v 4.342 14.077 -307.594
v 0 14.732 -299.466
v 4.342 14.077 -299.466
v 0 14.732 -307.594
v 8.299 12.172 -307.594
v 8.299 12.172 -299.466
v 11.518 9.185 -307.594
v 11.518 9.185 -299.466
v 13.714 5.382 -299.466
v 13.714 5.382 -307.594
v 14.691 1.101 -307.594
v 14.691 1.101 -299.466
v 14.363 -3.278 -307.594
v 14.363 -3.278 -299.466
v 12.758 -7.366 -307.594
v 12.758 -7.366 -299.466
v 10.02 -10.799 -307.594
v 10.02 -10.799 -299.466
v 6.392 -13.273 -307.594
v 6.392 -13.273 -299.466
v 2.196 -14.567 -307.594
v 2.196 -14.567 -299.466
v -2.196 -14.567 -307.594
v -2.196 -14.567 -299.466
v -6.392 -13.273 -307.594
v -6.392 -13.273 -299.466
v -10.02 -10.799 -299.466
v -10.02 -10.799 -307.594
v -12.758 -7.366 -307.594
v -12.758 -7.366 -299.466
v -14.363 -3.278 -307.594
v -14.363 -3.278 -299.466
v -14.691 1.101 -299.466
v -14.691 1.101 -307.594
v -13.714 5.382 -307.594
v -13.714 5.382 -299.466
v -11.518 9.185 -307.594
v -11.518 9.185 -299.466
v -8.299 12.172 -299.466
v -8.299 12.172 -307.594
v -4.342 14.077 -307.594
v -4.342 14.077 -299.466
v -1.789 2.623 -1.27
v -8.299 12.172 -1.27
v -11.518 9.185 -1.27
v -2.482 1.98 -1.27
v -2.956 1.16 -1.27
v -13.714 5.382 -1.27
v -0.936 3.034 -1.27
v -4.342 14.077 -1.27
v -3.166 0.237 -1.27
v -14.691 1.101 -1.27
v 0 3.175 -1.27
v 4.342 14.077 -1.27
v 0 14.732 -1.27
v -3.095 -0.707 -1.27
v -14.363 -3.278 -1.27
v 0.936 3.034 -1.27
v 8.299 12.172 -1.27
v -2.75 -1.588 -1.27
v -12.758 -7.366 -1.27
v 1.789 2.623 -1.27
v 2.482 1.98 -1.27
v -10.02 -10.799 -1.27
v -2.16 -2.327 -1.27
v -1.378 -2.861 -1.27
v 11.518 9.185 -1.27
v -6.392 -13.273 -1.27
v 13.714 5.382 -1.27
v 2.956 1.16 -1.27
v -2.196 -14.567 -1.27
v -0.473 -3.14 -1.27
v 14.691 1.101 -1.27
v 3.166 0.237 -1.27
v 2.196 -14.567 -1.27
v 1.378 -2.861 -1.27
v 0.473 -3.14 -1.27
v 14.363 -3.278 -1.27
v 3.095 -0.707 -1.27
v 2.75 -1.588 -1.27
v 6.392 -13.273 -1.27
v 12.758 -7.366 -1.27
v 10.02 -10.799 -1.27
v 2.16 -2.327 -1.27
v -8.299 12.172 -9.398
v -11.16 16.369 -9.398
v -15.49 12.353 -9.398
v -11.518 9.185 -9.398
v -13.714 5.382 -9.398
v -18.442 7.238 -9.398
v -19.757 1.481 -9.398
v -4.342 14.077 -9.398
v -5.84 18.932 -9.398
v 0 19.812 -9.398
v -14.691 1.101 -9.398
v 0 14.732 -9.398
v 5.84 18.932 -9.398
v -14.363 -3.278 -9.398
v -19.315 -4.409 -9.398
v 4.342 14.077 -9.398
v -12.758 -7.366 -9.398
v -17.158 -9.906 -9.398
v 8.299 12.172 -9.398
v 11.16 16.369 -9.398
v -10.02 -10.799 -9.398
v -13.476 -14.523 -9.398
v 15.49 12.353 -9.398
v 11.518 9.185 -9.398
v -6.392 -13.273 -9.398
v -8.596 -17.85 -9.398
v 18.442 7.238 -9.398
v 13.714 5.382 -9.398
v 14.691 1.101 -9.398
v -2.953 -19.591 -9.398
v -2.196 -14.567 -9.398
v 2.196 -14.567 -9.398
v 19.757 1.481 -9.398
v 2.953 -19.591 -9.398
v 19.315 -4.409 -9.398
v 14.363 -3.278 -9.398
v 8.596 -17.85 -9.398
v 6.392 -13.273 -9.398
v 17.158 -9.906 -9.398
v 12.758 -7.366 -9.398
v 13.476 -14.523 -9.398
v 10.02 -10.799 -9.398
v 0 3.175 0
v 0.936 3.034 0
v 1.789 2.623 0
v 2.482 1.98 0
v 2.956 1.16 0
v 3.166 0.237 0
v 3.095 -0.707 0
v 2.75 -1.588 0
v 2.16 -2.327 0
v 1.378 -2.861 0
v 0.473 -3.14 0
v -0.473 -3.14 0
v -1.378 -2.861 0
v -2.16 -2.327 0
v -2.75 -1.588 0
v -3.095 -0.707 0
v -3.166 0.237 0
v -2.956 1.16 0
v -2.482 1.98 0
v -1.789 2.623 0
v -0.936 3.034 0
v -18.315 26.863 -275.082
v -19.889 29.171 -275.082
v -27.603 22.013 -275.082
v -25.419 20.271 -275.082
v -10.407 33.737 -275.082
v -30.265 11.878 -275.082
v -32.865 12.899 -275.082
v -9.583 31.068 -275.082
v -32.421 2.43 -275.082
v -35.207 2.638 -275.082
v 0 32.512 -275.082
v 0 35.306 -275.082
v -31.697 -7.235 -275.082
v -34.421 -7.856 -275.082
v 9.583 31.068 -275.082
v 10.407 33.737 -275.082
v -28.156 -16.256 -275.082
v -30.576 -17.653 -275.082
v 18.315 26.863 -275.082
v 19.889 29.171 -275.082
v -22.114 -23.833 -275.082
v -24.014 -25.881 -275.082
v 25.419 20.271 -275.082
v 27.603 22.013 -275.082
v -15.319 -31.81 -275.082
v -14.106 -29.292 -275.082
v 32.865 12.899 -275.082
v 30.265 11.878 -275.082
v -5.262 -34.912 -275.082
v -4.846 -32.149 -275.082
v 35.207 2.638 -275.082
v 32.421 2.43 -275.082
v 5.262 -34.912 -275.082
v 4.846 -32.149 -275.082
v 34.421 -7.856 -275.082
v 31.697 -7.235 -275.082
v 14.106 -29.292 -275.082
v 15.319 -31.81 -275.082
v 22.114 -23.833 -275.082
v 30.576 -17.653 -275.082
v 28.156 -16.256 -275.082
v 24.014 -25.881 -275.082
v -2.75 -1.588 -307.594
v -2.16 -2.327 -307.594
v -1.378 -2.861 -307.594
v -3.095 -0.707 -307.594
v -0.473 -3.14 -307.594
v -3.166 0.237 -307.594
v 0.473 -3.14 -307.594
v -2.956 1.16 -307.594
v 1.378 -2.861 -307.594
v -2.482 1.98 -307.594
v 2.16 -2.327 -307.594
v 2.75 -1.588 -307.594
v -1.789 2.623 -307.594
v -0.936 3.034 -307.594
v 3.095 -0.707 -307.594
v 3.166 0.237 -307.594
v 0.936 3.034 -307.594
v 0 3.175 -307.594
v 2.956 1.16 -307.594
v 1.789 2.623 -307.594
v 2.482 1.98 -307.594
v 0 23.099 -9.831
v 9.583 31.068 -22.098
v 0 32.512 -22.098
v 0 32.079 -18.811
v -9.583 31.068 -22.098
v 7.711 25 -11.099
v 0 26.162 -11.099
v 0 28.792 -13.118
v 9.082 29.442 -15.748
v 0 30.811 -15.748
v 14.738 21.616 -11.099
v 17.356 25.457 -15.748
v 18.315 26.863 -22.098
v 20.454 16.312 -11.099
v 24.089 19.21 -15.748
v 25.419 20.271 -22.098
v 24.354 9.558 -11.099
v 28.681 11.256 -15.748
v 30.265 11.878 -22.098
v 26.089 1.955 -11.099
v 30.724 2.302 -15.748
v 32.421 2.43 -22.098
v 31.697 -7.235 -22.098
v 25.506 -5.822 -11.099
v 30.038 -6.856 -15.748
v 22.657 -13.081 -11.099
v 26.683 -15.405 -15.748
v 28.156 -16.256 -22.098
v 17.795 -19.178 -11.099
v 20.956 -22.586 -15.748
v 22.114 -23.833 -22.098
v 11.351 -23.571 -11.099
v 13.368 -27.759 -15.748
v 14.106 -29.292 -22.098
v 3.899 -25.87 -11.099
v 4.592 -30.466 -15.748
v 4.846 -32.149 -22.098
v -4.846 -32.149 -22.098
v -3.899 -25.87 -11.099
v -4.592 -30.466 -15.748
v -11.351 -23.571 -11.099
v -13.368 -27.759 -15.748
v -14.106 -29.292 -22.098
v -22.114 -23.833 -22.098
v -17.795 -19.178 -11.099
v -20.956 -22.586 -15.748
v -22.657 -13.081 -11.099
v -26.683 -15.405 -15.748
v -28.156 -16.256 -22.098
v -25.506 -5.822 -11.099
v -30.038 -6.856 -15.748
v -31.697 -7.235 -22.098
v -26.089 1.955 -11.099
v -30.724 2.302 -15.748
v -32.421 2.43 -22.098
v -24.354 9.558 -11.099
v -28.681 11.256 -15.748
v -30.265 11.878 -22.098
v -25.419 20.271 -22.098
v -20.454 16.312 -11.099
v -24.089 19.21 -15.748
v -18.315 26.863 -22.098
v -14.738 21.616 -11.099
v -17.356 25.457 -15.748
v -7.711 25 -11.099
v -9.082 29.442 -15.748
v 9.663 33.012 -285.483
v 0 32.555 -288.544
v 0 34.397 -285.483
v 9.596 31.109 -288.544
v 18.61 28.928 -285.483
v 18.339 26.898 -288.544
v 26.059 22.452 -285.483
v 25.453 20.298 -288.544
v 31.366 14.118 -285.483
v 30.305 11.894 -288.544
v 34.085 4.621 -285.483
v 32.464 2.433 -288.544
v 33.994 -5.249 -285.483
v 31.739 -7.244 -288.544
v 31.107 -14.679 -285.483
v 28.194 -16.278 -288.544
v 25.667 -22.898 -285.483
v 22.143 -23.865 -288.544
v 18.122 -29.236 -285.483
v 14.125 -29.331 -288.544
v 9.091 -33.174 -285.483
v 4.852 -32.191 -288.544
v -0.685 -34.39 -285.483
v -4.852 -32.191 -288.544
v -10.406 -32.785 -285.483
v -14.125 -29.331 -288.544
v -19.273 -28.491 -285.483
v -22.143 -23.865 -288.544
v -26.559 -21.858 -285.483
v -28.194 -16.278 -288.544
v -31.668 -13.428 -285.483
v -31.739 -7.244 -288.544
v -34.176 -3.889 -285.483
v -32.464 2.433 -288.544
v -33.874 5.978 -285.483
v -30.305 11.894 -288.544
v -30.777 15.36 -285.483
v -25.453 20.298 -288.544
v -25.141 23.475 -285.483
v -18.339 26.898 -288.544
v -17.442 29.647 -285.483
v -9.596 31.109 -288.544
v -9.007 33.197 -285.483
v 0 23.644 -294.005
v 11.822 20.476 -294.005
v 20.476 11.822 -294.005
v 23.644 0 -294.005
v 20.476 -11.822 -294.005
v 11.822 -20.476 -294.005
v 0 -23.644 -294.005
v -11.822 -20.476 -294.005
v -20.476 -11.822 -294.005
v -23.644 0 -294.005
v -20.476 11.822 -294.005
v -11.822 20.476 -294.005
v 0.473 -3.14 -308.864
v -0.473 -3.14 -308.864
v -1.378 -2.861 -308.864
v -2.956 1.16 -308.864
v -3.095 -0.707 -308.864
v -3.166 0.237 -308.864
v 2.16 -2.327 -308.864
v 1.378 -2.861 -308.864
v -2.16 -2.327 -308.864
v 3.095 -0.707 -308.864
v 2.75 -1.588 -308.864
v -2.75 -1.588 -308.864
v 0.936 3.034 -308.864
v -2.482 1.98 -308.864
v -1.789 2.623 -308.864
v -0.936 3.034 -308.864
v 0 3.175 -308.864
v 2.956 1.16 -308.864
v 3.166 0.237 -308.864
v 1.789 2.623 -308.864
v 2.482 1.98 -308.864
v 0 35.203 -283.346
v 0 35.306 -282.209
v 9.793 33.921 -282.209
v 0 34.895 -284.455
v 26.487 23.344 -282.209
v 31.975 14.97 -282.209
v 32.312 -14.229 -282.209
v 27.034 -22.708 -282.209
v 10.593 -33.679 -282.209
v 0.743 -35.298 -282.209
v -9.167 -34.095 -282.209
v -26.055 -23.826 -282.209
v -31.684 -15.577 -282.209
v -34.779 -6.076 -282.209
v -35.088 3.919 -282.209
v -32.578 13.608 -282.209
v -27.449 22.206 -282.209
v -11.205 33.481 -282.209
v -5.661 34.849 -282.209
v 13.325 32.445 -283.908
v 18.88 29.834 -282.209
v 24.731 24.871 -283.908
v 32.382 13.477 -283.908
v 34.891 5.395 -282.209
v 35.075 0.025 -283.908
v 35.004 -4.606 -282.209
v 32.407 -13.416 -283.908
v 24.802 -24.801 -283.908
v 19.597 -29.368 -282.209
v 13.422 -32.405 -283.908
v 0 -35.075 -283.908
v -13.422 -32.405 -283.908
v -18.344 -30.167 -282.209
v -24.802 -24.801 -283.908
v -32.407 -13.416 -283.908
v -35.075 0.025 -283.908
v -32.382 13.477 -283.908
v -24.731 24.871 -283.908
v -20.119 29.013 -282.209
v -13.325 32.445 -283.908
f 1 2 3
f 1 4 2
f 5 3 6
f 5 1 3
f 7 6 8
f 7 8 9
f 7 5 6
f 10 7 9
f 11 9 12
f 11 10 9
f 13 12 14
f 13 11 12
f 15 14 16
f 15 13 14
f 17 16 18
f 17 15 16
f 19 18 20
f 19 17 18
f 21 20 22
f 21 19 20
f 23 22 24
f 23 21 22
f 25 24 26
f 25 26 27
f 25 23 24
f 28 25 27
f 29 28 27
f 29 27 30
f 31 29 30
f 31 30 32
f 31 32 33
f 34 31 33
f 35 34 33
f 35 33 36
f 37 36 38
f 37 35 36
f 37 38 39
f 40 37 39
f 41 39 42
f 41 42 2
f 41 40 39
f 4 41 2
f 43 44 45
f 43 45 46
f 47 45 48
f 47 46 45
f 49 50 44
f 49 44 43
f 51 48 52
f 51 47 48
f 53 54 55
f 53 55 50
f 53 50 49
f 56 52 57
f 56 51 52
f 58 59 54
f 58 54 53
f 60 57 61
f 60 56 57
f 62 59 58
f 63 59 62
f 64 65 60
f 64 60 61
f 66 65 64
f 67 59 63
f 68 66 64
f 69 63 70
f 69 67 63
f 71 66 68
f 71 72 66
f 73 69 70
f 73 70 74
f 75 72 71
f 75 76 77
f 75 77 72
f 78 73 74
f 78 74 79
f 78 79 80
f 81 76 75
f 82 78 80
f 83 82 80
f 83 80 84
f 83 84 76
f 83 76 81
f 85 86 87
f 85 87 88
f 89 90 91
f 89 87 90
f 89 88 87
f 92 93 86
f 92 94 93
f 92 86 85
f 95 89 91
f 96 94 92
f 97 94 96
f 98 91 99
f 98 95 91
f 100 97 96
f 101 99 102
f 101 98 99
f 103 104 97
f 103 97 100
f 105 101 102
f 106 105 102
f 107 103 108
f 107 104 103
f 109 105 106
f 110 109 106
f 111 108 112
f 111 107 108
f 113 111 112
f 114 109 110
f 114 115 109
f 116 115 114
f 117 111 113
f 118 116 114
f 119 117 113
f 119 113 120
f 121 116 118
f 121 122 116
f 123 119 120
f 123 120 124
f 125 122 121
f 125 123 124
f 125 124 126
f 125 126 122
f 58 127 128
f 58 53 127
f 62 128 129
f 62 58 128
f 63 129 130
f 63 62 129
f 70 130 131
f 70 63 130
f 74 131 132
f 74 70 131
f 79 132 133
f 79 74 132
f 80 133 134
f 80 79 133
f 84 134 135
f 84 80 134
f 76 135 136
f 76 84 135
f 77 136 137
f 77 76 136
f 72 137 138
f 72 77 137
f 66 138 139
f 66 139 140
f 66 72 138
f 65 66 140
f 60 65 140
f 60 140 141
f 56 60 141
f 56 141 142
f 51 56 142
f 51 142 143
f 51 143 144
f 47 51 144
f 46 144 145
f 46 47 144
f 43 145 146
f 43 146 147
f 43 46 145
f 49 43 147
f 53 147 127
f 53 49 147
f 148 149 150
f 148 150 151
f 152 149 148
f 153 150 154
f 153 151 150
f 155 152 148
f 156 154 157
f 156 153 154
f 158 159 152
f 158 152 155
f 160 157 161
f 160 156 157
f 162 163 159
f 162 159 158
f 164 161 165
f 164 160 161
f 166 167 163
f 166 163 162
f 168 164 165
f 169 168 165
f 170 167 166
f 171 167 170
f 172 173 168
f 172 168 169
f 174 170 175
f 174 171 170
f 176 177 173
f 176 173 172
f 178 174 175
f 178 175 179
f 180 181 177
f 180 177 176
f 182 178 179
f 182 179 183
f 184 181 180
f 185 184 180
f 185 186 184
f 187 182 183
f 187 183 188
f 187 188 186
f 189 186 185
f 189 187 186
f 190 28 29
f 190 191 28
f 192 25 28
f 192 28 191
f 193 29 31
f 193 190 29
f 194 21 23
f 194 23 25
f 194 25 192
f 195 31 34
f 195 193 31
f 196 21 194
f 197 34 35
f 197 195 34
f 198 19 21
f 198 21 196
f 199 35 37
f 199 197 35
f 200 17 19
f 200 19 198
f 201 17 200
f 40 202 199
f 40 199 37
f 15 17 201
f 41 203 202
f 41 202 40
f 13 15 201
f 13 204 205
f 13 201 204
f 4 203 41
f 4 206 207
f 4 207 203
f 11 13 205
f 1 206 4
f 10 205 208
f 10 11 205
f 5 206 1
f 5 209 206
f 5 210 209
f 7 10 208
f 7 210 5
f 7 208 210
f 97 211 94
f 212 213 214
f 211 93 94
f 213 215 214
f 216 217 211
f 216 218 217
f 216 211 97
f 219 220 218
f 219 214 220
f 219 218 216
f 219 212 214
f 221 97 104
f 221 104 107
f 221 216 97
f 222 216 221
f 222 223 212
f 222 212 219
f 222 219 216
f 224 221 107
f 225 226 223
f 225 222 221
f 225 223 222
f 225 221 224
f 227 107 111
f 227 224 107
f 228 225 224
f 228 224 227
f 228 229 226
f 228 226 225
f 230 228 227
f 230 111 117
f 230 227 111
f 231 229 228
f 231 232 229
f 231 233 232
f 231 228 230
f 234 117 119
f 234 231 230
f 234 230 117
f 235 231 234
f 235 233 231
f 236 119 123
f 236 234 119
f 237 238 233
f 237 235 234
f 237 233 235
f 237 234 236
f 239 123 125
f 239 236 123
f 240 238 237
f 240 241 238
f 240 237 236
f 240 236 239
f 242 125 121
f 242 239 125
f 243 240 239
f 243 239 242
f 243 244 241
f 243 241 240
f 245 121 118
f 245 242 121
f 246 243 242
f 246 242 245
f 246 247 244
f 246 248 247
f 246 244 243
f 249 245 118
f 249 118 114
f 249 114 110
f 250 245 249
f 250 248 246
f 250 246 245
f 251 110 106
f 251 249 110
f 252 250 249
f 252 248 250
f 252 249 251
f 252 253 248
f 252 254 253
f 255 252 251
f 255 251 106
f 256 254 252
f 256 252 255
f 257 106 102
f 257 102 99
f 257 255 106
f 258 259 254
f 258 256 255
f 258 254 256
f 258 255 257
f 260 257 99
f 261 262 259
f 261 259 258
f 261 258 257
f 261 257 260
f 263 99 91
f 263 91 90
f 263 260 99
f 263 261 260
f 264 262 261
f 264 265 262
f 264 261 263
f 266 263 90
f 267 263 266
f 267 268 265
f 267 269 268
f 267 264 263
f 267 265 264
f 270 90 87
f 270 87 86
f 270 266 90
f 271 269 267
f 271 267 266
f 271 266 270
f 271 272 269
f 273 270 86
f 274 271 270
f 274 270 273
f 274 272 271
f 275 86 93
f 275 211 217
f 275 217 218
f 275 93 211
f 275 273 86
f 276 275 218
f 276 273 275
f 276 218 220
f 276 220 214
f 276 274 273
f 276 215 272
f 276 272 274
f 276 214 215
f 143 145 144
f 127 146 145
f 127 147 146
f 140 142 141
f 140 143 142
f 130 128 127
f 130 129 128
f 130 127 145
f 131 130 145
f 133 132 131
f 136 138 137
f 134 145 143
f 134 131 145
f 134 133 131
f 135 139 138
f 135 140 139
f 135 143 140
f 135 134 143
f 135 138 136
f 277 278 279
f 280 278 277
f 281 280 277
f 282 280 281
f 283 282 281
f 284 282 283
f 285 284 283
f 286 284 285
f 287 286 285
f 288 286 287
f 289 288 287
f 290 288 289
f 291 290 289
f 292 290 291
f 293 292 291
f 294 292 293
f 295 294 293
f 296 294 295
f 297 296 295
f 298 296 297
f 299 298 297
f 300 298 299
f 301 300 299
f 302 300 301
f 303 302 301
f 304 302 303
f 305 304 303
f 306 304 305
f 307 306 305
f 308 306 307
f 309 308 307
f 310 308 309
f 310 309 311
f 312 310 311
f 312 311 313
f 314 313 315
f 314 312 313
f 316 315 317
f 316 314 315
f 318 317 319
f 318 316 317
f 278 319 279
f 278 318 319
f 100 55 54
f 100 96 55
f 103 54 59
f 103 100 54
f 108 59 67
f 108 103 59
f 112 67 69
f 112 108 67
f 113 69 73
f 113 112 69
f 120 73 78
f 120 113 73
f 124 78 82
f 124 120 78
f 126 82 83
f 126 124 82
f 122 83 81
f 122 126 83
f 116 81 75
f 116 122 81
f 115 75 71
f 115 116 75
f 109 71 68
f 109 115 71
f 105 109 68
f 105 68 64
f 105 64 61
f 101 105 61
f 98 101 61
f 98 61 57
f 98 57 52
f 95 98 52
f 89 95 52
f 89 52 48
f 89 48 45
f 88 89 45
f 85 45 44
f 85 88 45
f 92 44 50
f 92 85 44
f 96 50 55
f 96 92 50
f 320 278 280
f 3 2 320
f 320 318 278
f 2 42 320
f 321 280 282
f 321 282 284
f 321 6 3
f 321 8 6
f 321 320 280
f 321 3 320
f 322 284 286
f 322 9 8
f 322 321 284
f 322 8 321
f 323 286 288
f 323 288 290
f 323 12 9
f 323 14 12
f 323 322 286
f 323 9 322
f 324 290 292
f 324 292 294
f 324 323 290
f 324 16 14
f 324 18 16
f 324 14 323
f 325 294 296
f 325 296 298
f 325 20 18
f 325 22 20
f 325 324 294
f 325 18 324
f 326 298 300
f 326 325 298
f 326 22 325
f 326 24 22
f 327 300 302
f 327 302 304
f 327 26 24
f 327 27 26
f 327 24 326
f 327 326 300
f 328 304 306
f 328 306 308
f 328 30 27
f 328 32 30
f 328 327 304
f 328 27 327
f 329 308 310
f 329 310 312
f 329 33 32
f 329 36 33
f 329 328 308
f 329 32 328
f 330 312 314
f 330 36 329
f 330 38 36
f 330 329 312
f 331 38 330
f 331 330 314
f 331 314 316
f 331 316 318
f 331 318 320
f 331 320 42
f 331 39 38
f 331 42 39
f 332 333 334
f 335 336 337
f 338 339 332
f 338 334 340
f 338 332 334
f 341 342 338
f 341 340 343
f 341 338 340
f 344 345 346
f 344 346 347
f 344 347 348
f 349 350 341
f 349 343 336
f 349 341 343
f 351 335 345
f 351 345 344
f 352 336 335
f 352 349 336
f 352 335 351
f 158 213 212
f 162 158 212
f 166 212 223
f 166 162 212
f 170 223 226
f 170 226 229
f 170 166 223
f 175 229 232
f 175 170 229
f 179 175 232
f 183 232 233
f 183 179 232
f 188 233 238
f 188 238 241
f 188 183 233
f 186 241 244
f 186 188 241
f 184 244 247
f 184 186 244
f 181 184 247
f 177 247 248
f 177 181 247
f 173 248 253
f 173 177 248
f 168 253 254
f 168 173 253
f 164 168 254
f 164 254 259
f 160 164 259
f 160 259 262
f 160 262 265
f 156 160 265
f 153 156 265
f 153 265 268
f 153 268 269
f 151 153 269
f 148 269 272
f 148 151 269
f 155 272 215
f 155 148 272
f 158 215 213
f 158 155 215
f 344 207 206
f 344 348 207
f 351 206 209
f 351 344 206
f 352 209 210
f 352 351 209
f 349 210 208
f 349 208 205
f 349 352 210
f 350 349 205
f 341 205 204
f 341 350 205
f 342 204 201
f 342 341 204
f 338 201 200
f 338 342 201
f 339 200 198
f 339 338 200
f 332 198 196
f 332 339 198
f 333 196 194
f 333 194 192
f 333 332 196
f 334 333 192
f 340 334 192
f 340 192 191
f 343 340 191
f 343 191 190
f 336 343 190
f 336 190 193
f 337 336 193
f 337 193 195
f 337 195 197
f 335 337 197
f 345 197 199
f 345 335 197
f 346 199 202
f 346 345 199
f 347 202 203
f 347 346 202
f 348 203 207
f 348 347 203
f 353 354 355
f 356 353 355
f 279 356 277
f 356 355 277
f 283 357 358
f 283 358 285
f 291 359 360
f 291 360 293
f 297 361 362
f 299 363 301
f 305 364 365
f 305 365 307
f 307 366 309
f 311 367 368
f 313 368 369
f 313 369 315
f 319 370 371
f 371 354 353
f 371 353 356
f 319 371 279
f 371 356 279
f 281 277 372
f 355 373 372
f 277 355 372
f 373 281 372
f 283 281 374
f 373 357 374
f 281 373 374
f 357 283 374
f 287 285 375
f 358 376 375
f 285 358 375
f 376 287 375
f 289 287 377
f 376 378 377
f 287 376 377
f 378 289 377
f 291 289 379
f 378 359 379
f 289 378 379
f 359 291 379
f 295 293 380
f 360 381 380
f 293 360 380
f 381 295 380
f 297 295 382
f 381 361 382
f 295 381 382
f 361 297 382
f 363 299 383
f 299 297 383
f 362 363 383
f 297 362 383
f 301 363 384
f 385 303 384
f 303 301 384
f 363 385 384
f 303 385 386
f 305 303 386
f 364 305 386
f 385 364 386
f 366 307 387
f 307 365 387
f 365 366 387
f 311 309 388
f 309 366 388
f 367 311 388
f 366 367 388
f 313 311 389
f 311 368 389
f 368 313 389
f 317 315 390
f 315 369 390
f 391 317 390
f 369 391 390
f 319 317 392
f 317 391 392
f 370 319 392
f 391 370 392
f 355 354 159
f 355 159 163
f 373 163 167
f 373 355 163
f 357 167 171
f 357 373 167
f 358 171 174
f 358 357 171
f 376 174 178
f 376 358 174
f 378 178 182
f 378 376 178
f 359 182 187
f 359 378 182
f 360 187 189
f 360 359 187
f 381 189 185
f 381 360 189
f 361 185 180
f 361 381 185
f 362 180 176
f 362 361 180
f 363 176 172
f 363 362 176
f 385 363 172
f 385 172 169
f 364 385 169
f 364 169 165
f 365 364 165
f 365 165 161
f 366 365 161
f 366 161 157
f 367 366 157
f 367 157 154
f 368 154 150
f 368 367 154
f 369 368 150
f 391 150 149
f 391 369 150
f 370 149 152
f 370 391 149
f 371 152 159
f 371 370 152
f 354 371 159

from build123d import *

# Parameters (mm, degrees)
FILLET1_R = 12.7
FILLET2_R = 6.35


with BuildPart() as part:
    # Sketch1 → Revolve1 (revolve)
    with BuildSketch(Plane(origin=(0, 0, 0), x_dir=(0, 0, -1), z_dir=(1, 0, 0))):
        Polygon((0, 0), (0, 3.175), (1.27, 3.175), (1.27, 14.732), (9.398, 14.732), (9.398, 32.512), (275.082, 32.512), (275.082, 35.306), (283.972, 35.306), (288.544, 32.555084127), (299.466, 14.732), (307.594, 14.732), (307.594, 3.175), (308.864, 3.175), (308.864, 0), align=None)
    revolve(axis=Axis((0, 0, 0), (0, 0, -1)))

    # Fillet1
    fillet1_edges = [part.edges().sort_by_distance(p)[0] for p in [
        (0, -32.512, -9.398),
    ]]
    fillet(fillet1_edges, radius=FILLET1_R)

    # Fillet2
    fillet2_edges = [part.edges().sort_by_distance(p)[0] for p in [
        (0, -35.306, -283.972),
    ]]
    fillet(fillet2_edges, radius=FILLET2_R)


solid = part.part
